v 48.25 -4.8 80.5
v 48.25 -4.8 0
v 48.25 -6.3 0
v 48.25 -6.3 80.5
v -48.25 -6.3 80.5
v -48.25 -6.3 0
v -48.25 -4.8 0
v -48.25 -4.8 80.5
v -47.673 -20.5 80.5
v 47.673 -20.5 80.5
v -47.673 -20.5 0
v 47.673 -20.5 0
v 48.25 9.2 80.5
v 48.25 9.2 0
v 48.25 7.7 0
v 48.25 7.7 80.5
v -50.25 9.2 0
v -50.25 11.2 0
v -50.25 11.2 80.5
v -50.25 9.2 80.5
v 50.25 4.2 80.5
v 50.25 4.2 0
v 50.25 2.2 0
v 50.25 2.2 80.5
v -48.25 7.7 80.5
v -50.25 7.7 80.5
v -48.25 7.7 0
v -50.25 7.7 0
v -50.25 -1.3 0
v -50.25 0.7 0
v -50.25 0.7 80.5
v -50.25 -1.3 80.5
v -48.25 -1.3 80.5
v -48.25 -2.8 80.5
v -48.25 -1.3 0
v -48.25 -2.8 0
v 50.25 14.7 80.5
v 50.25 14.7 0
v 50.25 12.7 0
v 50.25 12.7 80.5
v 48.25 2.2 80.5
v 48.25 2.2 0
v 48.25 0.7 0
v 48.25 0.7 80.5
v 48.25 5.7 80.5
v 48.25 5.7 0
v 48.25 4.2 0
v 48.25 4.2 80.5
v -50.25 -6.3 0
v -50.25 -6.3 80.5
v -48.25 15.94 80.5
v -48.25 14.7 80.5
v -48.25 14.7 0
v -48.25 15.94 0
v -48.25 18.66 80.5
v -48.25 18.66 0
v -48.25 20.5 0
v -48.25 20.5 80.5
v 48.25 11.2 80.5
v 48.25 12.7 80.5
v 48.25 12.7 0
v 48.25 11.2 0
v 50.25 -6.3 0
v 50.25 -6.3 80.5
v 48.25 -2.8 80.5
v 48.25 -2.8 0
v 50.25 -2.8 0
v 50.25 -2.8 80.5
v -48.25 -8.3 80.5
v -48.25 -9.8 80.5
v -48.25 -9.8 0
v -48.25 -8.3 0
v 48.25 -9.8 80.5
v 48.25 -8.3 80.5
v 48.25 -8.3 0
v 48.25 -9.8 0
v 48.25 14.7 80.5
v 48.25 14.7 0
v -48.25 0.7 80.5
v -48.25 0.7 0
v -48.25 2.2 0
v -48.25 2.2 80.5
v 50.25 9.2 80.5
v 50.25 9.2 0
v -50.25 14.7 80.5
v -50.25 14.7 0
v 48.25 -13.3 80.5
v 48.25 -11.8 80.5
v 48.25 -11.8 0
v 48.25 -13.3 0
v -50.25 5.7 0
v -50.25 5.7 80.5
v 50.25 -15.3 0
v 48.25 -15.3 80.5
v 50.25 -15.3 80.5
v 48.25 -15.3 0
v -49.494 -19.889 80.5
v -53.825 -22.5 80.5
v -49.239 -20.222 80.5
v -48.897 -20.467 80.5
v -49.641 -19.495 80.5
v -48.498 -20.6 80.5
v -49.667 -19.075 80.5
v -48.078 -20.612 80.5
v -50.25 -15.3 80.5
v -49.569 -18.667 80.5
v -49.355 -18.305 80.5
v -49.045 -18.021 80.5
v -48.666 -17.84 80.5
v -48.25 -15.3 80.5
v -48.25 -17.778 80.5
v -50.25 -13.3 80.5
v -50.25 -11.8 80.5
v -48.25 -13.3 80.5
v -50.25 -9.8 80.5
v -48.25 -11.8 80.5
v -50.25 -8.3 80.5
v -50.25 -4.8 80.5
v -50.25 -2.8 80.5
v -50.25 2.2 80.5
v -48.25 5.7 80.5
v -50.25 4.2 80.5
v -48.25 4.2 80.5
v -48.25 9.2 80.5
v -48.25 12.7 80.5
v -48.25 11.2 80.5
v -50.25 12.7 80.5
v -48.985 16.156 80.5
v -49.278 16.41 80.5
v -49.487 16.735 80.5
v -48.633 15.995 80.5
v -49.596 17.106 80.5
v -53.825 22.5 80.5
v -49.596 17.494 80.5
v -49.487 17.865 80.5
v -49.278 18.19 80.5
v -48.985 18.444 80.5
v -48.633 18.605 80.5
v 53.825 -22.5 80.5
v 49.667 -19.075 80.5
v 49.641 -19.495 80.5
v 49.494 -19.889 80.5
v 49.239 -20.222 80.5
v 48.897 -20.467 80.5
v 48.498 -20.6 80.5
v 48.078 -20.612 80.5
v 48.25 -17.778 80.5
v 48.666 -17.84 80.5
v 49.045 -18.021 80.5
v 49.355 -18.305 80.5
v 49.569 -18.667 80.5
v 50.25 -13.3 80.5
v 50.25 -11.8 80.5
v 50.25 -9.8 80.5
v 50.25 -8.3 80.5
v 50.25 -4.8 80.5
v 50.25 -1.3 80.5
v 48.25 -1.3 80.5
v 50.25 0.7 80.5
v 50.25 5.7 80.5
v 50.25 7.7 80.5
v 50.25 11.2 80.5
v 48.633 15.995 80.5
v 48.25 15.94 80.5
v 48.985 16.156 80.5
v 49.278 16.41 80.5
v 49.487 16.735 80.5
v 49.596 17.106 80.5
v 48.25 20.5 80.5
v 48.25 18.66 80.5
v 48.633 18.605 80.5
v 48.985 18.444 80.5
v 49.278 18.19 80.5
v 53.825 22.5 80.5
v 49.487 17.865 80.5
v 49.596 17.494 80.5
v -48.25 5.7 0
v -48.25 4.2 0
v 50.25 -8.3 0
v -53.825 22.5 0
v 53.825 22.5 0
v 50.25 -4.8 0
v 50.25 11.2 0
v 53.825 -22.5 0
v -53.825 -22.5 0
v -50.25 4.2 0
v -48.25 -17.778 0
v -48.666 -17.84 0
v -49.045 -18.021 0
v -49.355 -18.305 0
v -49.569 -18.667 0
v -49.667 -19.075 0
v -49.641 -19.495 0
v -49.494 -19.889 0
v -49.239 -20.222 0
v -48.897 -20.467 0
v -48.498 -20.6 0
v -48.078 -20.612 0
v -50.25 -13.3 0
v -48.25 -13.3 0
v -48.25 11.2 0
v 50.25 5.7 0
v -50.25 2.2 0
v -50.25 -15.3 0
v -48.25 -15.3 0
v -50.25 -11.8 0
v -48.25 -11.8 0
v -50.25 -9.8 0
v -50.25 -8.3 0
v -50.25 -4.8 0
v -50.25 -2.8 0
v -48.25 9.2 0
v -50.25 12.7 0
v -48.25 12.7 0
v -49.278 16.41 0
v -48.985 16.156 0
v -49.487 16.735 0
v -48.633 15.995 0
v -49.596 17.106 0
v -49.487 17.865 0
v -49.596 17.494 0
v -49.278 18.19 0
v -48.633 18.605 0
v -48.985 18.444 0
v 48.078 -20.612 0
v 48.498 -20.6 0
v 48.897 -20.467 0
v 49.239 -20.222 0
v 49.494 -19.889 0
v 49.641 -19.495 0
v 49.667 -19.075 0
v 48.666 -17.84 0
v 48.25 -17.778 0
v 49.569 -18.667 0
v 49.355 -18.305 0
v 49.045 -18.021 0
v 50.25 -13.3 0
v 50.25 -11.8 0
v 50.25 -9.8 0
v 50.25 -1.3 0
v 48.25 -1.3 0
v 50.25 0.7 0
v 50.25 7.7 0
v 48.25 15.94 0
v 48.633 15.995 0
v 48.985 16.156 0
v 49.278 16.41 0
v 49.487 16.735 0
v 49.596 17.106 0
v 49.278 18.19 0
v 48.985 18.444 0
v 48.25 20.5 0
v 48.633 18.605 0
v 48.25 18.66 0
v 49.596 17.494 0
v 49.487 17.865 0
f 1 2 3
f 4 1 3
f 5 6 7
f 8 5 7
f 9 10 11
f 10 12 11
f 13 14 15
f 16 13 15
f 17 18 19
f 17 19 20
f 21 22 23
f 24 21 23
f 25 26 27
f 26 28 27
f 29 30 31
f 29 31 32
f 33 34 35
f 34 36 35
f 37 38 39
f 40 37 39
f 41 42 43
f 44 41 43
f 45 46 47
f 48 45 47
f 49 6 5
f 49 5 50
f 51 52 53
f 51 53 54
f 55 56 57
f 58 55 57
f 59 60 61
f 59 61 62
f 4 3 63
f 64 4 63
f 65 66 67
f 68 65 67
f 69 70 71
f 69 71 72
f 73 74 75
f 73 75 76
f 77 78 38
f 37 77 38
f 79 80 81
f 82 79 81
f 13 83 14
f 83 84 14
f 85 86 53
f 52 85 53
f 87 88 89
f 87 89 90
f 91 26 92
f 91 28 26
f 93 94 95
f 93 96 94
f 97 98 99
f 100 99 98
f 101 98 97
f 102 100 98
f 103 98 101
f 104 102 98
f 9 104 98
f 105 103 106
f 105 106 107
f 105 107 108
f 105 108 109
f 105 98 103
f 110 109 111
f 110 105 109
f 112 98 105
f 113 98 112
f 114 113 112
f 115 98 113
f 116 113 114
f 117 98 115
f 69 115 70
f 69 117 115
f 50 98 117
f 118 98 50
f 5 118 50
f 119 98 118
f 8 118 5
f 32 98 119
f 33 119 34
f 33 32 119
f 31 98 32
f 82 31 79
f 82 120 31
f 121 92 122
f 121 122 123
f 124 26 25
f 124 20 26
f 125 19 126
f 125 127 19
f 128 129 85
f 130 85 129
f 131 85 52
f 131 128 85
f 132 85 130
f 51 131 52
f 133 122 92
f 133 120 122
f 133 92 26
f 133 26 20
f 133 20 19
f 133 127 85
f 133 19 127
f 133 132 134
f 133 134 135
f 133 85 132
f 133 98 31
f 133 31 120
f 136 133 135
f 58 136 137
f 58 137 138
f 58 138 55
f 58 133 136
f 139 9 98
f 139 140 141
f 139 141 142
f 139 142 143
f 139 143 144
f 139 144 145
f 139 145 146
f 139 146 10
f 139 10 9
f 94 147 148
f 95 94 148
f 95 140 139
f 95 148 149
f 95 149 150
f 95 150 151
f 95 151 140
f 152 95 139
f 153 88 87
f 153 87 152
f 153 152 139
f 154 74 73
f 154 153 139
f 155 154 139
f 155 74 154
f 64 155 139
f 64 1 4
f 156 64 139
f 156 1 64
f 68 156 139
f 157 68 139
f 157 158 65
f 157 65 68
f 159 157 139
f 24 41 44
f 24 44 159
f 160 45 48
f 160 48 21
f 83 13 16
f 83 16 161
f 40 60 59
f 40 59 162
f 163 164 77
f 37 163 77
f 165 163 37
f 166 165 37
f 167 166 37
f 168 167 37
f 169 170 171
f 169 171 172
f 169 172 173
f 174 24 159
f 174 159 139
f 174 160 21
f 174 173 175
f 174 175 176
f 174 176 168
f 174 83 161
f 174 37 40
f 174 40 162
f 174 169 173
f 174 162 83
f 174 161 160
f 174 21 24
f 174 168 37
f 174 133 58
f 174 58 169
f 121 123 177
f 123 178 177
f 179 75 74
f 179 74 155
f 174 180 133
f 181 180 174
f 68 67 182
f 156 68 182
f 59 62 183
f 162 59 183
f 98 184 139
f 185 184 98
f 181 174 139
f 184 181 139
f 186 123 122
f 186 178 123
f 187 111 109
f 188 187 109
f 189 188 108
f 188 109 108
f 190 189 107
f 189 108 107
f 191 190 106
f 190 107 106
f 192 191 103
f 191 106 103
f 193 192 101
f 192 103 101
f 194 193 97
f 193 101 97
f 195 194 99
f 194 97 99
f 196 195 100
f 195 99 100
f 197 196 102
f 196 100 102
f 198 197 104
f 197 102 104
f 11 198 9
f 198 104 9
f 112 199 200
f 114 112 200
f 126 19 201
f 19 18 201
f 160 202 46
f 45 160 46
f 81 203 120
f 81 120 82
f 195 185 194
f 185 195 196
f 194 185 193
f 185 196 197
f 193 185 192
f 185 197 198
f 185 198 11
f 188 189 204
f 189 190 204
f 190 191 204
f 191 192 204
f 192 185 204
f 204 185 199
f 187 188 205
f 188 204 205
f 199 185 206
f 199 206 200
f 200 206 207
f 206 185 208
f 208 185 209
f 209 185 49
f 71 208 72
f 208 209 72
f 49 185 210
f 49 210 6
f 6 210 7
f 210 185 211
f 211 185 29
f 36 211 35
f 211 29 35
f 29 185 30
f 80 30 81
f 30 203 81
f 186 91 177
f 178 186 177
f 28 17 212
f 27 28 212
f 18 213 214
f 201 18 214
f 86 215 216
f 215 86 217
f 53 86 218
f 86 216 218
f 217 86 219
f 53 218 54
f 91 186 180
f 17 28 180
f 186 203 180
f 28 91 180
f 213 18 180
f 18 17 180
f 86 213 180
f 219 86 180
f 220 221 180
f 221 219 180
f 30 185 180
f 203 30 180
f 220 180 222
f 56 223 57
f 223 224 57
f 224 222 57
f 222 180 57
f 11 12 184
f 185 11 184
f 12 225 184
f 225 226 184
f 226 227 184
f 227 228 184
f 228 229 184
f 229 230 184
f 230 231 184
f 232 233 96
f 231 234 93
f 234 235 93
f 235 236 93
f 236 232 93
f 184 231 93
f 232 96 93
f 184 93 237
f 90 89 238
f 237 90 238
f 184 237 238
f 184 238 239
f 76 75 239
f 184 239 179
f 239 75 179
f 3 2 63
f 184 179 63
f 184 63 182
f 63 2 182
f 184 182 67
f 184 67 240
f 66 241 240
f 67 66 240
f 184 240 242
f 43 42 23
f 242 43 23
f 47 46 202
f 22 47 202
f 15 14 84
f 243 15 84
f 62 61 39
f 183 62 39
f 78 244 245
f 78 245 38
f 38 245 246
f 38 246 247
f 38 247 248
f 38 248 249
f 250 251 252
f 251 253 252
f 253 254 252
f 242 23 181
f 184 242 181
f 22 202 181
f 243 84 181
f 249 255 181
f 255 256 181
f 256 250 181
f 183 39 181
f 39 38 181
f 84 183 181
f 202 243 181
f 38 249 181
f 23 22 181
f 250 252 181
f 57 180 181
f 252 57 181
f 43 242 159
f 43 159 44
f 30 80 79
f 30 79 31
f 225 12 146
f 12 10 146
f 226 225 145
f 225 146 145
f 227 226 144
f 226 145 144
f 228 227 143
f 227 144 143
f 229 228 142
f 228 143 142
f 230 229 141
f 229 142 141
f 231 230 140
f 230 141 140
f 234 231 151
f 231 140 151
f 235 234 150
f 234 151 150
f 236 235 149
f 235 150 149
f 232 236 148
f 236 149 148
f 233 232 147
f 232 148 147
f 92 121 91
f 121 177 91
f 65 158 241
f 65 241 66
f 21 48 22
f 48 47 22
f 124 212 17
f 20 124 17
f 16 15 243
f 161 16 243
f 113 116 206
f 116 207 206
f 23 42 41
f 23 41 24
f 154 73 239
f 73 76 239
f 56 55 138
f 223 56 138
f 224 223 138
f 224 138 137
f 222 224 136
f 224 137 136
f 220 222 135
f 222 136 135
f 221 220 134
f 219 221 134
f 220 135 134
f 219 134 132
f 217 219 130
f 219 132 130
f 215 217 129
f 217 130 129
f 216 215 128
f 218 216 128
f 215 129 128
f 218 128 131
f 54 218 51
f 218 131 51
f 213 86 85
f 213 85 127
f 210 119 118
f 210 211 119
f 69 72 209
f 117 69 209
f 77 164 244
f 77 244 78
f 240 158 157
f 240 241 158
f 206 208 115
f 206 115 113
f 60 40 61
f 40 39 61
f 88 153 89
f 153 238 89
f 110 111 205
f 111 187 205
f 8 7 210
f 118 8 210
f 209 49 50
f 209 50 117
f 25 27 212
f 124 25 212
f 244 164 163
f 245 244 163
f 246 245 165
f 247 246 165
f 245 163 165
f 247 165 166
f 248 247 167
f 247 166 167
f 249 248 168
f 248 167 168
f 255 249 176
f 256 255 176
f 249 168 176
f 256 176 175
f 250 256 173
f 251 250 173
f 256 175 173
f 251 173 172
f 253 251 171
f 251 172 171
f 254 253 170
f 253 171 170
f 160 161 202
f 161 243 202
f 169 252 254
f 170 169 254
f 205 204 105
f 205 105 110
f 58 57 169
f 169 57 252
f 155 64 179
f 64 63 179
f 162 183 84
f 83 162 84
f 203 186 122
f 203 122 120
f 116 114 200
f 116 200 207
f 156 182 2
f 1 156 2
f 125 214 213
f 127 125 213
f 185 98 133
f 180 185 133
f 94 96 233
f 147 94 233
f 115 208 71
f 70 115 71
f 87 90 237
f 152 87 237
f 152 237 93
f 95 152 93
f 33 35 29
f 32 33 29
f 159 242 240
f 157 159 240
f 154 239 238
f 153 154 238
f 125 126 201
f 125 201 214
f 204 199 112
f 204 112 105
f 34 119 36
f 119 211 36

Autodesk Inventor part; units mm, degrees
ref_plane "YZ Plane" through (0, 0, 0) normal (1, 0, 0) x (0, 1, 0)
ref_plane "XZ Plane" through (0, 0, 0) normal (0, 1, 0) x (-1, 0, 0)
ref_plane "XY Plane" through (0, 0, 0) normal (0, 0, 1) x (1, 0, 0)
sketch "Sketch2" plane through (0, 0, 0) normal (0, 0, 1) x (1, 0, 0)
  line L0 (-53.825, 22.5) -> (53.825, 22.5)
  line L1 (53.825, 22.5) -> (53.825, -22.5)
  line L2 (53.825, -22.5) -> (-53.825, -22.5)
  line L3 (-53.825, -22.5) -> (-53.825, 22.5)
  line L4 (-48.25, 20.5) -> (48.25, 20.5)
  line L5 (48.25, -20.5) -> (-48.25, -20.5)
  line L6 (-50.25, 19.8997) -> (-50.25, -18.4997)
  line L7 (50.25, 19.3484) -> (50.25, -18.4997)
  line L8 (48.25, 14.7) -> (50.25, 14.7)
  line L9 (-50.25, 14.7) -> (-48.25, 14.7)
  line L10 (-50.25, -15.3) -> (-48.25, -15.3)
  line L11 (48.25, -15.3) -> (50.25, -15.3)
  line L12 (49.25, 14.7) -> (49.25, -15.3) construction
  line L13 (49.25, -0.3) -> (-49.8494, -0.3) construction
  line L14 (48.25, -1.3) -> (50.25, -1.3)
  line L15 (50.25, 0.7) -> (48.25, 0.7)
  line L16 (-48.25, 0.7) -> (-50.25, 0.7)
  line L17 (-48.25, -1.3) -> (-50.25, -1.3)
  line L18 (-50.25, 2.2) -> (-48.25, 2.2)
  line L19 (48.25, 2.2) -> (50.25, 2.2)
  line L20 (-50.25, -2.8) -> (-48.25, -2.8)
  line L21 (48.25, -2.8) -> (50.25, -2.8)
  line L22 (-48.25, 4.2) -> (-50.25, 4.2)
  line L23 (48.25, 4.2) -> (50.25, 4.2)
  line L24 (50.25, -4.8) -> (48.25, -4.8)
  line L25 (-48.25, -4.8) -> (-50.25, -4.8)
  line L26 (48.25, -1.3) -> (48.25, -2.8)
  line L27 (48.25, 2.2) -> (48.25, 0.7)
  line L28 (-48.25, -2.8) -> (-48.25, -1.3)
  line L29 (-48.25, 0.7) -> (-48.25, 2.2)
  line L30 (-48.25, -6.3) -> (-50.25, -6.3)
  line L31 (48.25, -6.3) -> (50.25, -6.3)
  line L32 (48.25, -8.3) -> (50.25, -8.3)
  line L33 (-48.25, -8.3) -> (-50.25, -8.3)
  line L34 (-50.25, -9.8) -> (-48.25, -9.8)
  line L35 (48.25, -9.8) -> (50.25, -9.8)
  line L36 (50.25, -11.8) -> (48.25, -11.8)
  line L37 (-48.25, -11.8) -> (-50.25, -11.8)
  line L38 (-50.25, -13.3) -> (-48.25, -13.3)
  line L39 (48.25, -13.3) -> (50.25, -13.3)
  line L40 (50.25, 5.7) -> (48.25, 5.7)
  line L41 (-48.25, 5.7) -> (-50.25, 5.7)
  line L42 (-50.25, 7.7) -> (-48.25, 7.7)
  line L43 (48.25, 7.7) -> (50.25, 7.7)
  line L44 (50.25, 9.2) -> (48.25, 9.2)
  line L45 (-48.25, 9.2) -> (-50.25, 9.2)
  line L46 (-50.25, 11.2) -> (-48.25, 11.2)
  line L47 (48.25, 11.2) -> (50.25, 11.2)
  line L48 (50.25, 12.7) -> (48.25, 12.7)
  line L49 (-48.25, 12.7) -> (-50.25, 12.7)
  line L50 (48.25, -4.8) -> (48.25, -6.3)
  line L51 (48.25, -8.3) -> (48.25, -9.8)
  line L52 (48.25, -11.8) -> (48.25, -13.3)
  line L53 (48.25, -15.3) -> (48.25, -20.5)
  line L54 (48.25, 5.7) -> (48.25, 4.2)
  line L55 (48.25, 9.2) -> (48.25, 7.7)
  line L56 (48.25, 20.5) -> (48.25, 14.7)
  line L57 (48.25, 12.7) -> (48.25, 11.2)
  line L58 (-48.25, -20.5) -> (-48.25, -15.3)
  line L59 (-48.25, -13.3) -> (-48.25, -11.8)
  line L60 (-48.25, -9.8) -> (-48.25, -8.3)
  line L61 (-48.25, -6.3) -> (-48.25, -4.8)
  line L62 (-48.25, 4.2) -> (-48.25, 5.7)
  line L63 (-48.25, 7.7) -> (-48.25, 9.2)
  line L64 (-48.25, 11.2) -> (-48.25, 12.7)
  line L65 (-48.25, 14.7) -> (-48.25, 20.5)
  point P0 (0, 0)
  dimension "d0" = 107.65
  dimension "d1" = 53.825
  dimension "d2" = 45
  dimension "d3" = 22.5
  dimension "d4" = 96.5
  dimension "d6" = 20.5
  dimension "d7" = 20.5
  dimension "d8" = 50.25
  dimension "d9" = 50.25
  dimension "d10" = 5.8
  dimension "d11" = 5.2
  dimension "d12" = 2
  dimension "d13" = 1
  dimension "d14" = 5
  dimension "d15" = 2.5
  dimension "d16" = 2
  dimension "d17" = 5
  dimension "d18" = 9
  dimension "d19" = 4.5
  dimension "d20" = 12
  dimension "d21" = 6
  dimension "d22" = 16
  dimension "d23" = 8
  dimension "d24" = 19
  dimension "d25" = 9.5
  dimension "d26" = 23
  dimension "d27" = 11.5
  dimension "d28" = 26
  dimension "d29" = 13
extrude "Extrusion1" add sketch "Sketch2" along normal blind 80.5 contours L0 L1 L2 L3 | L49 L64 L46 L6 | L7 L47 L57 L48 | L45 L63 L42 L6 | L7 L43 L55 L44 | L41 L62 L22 L6 | L7 L23 L54 L40 | L18 L29 L16 L6 | L7 L15 L27 L19 | L17 L28 L20 L6 | L7 L21 L26 L14 | L25 L61 L30 L6 | L7 L31 L50 L24 | L33 L60 L34 L6 | L7 L35 L51 L32 | L37 L59 L38 L6 | L7 L39 L52 L36
sketch "Sketch3" plane through (0, 0, 80.5) normal (0, 0, 1) x (1, 0, 0)
  circle A0 centre (48.25, -19.2) radius 1.4223
  circle A1 centre (48.25, 17.3) radius 1.3597
  point P0 (0, 0)
  dimension "d32" = 19.2
  dimension "d33" = 17.3
  dimension "d34" = 48.25
  dimension "d35" = 48.25
extrude "Extrusion2" cut sketch "Sketch3" against normal through all
mirror "Mirror1" about plane through (0, 0, 0) normal (1, 0, 0) of "Extrusion2"
properties part number "40mm_Case"
